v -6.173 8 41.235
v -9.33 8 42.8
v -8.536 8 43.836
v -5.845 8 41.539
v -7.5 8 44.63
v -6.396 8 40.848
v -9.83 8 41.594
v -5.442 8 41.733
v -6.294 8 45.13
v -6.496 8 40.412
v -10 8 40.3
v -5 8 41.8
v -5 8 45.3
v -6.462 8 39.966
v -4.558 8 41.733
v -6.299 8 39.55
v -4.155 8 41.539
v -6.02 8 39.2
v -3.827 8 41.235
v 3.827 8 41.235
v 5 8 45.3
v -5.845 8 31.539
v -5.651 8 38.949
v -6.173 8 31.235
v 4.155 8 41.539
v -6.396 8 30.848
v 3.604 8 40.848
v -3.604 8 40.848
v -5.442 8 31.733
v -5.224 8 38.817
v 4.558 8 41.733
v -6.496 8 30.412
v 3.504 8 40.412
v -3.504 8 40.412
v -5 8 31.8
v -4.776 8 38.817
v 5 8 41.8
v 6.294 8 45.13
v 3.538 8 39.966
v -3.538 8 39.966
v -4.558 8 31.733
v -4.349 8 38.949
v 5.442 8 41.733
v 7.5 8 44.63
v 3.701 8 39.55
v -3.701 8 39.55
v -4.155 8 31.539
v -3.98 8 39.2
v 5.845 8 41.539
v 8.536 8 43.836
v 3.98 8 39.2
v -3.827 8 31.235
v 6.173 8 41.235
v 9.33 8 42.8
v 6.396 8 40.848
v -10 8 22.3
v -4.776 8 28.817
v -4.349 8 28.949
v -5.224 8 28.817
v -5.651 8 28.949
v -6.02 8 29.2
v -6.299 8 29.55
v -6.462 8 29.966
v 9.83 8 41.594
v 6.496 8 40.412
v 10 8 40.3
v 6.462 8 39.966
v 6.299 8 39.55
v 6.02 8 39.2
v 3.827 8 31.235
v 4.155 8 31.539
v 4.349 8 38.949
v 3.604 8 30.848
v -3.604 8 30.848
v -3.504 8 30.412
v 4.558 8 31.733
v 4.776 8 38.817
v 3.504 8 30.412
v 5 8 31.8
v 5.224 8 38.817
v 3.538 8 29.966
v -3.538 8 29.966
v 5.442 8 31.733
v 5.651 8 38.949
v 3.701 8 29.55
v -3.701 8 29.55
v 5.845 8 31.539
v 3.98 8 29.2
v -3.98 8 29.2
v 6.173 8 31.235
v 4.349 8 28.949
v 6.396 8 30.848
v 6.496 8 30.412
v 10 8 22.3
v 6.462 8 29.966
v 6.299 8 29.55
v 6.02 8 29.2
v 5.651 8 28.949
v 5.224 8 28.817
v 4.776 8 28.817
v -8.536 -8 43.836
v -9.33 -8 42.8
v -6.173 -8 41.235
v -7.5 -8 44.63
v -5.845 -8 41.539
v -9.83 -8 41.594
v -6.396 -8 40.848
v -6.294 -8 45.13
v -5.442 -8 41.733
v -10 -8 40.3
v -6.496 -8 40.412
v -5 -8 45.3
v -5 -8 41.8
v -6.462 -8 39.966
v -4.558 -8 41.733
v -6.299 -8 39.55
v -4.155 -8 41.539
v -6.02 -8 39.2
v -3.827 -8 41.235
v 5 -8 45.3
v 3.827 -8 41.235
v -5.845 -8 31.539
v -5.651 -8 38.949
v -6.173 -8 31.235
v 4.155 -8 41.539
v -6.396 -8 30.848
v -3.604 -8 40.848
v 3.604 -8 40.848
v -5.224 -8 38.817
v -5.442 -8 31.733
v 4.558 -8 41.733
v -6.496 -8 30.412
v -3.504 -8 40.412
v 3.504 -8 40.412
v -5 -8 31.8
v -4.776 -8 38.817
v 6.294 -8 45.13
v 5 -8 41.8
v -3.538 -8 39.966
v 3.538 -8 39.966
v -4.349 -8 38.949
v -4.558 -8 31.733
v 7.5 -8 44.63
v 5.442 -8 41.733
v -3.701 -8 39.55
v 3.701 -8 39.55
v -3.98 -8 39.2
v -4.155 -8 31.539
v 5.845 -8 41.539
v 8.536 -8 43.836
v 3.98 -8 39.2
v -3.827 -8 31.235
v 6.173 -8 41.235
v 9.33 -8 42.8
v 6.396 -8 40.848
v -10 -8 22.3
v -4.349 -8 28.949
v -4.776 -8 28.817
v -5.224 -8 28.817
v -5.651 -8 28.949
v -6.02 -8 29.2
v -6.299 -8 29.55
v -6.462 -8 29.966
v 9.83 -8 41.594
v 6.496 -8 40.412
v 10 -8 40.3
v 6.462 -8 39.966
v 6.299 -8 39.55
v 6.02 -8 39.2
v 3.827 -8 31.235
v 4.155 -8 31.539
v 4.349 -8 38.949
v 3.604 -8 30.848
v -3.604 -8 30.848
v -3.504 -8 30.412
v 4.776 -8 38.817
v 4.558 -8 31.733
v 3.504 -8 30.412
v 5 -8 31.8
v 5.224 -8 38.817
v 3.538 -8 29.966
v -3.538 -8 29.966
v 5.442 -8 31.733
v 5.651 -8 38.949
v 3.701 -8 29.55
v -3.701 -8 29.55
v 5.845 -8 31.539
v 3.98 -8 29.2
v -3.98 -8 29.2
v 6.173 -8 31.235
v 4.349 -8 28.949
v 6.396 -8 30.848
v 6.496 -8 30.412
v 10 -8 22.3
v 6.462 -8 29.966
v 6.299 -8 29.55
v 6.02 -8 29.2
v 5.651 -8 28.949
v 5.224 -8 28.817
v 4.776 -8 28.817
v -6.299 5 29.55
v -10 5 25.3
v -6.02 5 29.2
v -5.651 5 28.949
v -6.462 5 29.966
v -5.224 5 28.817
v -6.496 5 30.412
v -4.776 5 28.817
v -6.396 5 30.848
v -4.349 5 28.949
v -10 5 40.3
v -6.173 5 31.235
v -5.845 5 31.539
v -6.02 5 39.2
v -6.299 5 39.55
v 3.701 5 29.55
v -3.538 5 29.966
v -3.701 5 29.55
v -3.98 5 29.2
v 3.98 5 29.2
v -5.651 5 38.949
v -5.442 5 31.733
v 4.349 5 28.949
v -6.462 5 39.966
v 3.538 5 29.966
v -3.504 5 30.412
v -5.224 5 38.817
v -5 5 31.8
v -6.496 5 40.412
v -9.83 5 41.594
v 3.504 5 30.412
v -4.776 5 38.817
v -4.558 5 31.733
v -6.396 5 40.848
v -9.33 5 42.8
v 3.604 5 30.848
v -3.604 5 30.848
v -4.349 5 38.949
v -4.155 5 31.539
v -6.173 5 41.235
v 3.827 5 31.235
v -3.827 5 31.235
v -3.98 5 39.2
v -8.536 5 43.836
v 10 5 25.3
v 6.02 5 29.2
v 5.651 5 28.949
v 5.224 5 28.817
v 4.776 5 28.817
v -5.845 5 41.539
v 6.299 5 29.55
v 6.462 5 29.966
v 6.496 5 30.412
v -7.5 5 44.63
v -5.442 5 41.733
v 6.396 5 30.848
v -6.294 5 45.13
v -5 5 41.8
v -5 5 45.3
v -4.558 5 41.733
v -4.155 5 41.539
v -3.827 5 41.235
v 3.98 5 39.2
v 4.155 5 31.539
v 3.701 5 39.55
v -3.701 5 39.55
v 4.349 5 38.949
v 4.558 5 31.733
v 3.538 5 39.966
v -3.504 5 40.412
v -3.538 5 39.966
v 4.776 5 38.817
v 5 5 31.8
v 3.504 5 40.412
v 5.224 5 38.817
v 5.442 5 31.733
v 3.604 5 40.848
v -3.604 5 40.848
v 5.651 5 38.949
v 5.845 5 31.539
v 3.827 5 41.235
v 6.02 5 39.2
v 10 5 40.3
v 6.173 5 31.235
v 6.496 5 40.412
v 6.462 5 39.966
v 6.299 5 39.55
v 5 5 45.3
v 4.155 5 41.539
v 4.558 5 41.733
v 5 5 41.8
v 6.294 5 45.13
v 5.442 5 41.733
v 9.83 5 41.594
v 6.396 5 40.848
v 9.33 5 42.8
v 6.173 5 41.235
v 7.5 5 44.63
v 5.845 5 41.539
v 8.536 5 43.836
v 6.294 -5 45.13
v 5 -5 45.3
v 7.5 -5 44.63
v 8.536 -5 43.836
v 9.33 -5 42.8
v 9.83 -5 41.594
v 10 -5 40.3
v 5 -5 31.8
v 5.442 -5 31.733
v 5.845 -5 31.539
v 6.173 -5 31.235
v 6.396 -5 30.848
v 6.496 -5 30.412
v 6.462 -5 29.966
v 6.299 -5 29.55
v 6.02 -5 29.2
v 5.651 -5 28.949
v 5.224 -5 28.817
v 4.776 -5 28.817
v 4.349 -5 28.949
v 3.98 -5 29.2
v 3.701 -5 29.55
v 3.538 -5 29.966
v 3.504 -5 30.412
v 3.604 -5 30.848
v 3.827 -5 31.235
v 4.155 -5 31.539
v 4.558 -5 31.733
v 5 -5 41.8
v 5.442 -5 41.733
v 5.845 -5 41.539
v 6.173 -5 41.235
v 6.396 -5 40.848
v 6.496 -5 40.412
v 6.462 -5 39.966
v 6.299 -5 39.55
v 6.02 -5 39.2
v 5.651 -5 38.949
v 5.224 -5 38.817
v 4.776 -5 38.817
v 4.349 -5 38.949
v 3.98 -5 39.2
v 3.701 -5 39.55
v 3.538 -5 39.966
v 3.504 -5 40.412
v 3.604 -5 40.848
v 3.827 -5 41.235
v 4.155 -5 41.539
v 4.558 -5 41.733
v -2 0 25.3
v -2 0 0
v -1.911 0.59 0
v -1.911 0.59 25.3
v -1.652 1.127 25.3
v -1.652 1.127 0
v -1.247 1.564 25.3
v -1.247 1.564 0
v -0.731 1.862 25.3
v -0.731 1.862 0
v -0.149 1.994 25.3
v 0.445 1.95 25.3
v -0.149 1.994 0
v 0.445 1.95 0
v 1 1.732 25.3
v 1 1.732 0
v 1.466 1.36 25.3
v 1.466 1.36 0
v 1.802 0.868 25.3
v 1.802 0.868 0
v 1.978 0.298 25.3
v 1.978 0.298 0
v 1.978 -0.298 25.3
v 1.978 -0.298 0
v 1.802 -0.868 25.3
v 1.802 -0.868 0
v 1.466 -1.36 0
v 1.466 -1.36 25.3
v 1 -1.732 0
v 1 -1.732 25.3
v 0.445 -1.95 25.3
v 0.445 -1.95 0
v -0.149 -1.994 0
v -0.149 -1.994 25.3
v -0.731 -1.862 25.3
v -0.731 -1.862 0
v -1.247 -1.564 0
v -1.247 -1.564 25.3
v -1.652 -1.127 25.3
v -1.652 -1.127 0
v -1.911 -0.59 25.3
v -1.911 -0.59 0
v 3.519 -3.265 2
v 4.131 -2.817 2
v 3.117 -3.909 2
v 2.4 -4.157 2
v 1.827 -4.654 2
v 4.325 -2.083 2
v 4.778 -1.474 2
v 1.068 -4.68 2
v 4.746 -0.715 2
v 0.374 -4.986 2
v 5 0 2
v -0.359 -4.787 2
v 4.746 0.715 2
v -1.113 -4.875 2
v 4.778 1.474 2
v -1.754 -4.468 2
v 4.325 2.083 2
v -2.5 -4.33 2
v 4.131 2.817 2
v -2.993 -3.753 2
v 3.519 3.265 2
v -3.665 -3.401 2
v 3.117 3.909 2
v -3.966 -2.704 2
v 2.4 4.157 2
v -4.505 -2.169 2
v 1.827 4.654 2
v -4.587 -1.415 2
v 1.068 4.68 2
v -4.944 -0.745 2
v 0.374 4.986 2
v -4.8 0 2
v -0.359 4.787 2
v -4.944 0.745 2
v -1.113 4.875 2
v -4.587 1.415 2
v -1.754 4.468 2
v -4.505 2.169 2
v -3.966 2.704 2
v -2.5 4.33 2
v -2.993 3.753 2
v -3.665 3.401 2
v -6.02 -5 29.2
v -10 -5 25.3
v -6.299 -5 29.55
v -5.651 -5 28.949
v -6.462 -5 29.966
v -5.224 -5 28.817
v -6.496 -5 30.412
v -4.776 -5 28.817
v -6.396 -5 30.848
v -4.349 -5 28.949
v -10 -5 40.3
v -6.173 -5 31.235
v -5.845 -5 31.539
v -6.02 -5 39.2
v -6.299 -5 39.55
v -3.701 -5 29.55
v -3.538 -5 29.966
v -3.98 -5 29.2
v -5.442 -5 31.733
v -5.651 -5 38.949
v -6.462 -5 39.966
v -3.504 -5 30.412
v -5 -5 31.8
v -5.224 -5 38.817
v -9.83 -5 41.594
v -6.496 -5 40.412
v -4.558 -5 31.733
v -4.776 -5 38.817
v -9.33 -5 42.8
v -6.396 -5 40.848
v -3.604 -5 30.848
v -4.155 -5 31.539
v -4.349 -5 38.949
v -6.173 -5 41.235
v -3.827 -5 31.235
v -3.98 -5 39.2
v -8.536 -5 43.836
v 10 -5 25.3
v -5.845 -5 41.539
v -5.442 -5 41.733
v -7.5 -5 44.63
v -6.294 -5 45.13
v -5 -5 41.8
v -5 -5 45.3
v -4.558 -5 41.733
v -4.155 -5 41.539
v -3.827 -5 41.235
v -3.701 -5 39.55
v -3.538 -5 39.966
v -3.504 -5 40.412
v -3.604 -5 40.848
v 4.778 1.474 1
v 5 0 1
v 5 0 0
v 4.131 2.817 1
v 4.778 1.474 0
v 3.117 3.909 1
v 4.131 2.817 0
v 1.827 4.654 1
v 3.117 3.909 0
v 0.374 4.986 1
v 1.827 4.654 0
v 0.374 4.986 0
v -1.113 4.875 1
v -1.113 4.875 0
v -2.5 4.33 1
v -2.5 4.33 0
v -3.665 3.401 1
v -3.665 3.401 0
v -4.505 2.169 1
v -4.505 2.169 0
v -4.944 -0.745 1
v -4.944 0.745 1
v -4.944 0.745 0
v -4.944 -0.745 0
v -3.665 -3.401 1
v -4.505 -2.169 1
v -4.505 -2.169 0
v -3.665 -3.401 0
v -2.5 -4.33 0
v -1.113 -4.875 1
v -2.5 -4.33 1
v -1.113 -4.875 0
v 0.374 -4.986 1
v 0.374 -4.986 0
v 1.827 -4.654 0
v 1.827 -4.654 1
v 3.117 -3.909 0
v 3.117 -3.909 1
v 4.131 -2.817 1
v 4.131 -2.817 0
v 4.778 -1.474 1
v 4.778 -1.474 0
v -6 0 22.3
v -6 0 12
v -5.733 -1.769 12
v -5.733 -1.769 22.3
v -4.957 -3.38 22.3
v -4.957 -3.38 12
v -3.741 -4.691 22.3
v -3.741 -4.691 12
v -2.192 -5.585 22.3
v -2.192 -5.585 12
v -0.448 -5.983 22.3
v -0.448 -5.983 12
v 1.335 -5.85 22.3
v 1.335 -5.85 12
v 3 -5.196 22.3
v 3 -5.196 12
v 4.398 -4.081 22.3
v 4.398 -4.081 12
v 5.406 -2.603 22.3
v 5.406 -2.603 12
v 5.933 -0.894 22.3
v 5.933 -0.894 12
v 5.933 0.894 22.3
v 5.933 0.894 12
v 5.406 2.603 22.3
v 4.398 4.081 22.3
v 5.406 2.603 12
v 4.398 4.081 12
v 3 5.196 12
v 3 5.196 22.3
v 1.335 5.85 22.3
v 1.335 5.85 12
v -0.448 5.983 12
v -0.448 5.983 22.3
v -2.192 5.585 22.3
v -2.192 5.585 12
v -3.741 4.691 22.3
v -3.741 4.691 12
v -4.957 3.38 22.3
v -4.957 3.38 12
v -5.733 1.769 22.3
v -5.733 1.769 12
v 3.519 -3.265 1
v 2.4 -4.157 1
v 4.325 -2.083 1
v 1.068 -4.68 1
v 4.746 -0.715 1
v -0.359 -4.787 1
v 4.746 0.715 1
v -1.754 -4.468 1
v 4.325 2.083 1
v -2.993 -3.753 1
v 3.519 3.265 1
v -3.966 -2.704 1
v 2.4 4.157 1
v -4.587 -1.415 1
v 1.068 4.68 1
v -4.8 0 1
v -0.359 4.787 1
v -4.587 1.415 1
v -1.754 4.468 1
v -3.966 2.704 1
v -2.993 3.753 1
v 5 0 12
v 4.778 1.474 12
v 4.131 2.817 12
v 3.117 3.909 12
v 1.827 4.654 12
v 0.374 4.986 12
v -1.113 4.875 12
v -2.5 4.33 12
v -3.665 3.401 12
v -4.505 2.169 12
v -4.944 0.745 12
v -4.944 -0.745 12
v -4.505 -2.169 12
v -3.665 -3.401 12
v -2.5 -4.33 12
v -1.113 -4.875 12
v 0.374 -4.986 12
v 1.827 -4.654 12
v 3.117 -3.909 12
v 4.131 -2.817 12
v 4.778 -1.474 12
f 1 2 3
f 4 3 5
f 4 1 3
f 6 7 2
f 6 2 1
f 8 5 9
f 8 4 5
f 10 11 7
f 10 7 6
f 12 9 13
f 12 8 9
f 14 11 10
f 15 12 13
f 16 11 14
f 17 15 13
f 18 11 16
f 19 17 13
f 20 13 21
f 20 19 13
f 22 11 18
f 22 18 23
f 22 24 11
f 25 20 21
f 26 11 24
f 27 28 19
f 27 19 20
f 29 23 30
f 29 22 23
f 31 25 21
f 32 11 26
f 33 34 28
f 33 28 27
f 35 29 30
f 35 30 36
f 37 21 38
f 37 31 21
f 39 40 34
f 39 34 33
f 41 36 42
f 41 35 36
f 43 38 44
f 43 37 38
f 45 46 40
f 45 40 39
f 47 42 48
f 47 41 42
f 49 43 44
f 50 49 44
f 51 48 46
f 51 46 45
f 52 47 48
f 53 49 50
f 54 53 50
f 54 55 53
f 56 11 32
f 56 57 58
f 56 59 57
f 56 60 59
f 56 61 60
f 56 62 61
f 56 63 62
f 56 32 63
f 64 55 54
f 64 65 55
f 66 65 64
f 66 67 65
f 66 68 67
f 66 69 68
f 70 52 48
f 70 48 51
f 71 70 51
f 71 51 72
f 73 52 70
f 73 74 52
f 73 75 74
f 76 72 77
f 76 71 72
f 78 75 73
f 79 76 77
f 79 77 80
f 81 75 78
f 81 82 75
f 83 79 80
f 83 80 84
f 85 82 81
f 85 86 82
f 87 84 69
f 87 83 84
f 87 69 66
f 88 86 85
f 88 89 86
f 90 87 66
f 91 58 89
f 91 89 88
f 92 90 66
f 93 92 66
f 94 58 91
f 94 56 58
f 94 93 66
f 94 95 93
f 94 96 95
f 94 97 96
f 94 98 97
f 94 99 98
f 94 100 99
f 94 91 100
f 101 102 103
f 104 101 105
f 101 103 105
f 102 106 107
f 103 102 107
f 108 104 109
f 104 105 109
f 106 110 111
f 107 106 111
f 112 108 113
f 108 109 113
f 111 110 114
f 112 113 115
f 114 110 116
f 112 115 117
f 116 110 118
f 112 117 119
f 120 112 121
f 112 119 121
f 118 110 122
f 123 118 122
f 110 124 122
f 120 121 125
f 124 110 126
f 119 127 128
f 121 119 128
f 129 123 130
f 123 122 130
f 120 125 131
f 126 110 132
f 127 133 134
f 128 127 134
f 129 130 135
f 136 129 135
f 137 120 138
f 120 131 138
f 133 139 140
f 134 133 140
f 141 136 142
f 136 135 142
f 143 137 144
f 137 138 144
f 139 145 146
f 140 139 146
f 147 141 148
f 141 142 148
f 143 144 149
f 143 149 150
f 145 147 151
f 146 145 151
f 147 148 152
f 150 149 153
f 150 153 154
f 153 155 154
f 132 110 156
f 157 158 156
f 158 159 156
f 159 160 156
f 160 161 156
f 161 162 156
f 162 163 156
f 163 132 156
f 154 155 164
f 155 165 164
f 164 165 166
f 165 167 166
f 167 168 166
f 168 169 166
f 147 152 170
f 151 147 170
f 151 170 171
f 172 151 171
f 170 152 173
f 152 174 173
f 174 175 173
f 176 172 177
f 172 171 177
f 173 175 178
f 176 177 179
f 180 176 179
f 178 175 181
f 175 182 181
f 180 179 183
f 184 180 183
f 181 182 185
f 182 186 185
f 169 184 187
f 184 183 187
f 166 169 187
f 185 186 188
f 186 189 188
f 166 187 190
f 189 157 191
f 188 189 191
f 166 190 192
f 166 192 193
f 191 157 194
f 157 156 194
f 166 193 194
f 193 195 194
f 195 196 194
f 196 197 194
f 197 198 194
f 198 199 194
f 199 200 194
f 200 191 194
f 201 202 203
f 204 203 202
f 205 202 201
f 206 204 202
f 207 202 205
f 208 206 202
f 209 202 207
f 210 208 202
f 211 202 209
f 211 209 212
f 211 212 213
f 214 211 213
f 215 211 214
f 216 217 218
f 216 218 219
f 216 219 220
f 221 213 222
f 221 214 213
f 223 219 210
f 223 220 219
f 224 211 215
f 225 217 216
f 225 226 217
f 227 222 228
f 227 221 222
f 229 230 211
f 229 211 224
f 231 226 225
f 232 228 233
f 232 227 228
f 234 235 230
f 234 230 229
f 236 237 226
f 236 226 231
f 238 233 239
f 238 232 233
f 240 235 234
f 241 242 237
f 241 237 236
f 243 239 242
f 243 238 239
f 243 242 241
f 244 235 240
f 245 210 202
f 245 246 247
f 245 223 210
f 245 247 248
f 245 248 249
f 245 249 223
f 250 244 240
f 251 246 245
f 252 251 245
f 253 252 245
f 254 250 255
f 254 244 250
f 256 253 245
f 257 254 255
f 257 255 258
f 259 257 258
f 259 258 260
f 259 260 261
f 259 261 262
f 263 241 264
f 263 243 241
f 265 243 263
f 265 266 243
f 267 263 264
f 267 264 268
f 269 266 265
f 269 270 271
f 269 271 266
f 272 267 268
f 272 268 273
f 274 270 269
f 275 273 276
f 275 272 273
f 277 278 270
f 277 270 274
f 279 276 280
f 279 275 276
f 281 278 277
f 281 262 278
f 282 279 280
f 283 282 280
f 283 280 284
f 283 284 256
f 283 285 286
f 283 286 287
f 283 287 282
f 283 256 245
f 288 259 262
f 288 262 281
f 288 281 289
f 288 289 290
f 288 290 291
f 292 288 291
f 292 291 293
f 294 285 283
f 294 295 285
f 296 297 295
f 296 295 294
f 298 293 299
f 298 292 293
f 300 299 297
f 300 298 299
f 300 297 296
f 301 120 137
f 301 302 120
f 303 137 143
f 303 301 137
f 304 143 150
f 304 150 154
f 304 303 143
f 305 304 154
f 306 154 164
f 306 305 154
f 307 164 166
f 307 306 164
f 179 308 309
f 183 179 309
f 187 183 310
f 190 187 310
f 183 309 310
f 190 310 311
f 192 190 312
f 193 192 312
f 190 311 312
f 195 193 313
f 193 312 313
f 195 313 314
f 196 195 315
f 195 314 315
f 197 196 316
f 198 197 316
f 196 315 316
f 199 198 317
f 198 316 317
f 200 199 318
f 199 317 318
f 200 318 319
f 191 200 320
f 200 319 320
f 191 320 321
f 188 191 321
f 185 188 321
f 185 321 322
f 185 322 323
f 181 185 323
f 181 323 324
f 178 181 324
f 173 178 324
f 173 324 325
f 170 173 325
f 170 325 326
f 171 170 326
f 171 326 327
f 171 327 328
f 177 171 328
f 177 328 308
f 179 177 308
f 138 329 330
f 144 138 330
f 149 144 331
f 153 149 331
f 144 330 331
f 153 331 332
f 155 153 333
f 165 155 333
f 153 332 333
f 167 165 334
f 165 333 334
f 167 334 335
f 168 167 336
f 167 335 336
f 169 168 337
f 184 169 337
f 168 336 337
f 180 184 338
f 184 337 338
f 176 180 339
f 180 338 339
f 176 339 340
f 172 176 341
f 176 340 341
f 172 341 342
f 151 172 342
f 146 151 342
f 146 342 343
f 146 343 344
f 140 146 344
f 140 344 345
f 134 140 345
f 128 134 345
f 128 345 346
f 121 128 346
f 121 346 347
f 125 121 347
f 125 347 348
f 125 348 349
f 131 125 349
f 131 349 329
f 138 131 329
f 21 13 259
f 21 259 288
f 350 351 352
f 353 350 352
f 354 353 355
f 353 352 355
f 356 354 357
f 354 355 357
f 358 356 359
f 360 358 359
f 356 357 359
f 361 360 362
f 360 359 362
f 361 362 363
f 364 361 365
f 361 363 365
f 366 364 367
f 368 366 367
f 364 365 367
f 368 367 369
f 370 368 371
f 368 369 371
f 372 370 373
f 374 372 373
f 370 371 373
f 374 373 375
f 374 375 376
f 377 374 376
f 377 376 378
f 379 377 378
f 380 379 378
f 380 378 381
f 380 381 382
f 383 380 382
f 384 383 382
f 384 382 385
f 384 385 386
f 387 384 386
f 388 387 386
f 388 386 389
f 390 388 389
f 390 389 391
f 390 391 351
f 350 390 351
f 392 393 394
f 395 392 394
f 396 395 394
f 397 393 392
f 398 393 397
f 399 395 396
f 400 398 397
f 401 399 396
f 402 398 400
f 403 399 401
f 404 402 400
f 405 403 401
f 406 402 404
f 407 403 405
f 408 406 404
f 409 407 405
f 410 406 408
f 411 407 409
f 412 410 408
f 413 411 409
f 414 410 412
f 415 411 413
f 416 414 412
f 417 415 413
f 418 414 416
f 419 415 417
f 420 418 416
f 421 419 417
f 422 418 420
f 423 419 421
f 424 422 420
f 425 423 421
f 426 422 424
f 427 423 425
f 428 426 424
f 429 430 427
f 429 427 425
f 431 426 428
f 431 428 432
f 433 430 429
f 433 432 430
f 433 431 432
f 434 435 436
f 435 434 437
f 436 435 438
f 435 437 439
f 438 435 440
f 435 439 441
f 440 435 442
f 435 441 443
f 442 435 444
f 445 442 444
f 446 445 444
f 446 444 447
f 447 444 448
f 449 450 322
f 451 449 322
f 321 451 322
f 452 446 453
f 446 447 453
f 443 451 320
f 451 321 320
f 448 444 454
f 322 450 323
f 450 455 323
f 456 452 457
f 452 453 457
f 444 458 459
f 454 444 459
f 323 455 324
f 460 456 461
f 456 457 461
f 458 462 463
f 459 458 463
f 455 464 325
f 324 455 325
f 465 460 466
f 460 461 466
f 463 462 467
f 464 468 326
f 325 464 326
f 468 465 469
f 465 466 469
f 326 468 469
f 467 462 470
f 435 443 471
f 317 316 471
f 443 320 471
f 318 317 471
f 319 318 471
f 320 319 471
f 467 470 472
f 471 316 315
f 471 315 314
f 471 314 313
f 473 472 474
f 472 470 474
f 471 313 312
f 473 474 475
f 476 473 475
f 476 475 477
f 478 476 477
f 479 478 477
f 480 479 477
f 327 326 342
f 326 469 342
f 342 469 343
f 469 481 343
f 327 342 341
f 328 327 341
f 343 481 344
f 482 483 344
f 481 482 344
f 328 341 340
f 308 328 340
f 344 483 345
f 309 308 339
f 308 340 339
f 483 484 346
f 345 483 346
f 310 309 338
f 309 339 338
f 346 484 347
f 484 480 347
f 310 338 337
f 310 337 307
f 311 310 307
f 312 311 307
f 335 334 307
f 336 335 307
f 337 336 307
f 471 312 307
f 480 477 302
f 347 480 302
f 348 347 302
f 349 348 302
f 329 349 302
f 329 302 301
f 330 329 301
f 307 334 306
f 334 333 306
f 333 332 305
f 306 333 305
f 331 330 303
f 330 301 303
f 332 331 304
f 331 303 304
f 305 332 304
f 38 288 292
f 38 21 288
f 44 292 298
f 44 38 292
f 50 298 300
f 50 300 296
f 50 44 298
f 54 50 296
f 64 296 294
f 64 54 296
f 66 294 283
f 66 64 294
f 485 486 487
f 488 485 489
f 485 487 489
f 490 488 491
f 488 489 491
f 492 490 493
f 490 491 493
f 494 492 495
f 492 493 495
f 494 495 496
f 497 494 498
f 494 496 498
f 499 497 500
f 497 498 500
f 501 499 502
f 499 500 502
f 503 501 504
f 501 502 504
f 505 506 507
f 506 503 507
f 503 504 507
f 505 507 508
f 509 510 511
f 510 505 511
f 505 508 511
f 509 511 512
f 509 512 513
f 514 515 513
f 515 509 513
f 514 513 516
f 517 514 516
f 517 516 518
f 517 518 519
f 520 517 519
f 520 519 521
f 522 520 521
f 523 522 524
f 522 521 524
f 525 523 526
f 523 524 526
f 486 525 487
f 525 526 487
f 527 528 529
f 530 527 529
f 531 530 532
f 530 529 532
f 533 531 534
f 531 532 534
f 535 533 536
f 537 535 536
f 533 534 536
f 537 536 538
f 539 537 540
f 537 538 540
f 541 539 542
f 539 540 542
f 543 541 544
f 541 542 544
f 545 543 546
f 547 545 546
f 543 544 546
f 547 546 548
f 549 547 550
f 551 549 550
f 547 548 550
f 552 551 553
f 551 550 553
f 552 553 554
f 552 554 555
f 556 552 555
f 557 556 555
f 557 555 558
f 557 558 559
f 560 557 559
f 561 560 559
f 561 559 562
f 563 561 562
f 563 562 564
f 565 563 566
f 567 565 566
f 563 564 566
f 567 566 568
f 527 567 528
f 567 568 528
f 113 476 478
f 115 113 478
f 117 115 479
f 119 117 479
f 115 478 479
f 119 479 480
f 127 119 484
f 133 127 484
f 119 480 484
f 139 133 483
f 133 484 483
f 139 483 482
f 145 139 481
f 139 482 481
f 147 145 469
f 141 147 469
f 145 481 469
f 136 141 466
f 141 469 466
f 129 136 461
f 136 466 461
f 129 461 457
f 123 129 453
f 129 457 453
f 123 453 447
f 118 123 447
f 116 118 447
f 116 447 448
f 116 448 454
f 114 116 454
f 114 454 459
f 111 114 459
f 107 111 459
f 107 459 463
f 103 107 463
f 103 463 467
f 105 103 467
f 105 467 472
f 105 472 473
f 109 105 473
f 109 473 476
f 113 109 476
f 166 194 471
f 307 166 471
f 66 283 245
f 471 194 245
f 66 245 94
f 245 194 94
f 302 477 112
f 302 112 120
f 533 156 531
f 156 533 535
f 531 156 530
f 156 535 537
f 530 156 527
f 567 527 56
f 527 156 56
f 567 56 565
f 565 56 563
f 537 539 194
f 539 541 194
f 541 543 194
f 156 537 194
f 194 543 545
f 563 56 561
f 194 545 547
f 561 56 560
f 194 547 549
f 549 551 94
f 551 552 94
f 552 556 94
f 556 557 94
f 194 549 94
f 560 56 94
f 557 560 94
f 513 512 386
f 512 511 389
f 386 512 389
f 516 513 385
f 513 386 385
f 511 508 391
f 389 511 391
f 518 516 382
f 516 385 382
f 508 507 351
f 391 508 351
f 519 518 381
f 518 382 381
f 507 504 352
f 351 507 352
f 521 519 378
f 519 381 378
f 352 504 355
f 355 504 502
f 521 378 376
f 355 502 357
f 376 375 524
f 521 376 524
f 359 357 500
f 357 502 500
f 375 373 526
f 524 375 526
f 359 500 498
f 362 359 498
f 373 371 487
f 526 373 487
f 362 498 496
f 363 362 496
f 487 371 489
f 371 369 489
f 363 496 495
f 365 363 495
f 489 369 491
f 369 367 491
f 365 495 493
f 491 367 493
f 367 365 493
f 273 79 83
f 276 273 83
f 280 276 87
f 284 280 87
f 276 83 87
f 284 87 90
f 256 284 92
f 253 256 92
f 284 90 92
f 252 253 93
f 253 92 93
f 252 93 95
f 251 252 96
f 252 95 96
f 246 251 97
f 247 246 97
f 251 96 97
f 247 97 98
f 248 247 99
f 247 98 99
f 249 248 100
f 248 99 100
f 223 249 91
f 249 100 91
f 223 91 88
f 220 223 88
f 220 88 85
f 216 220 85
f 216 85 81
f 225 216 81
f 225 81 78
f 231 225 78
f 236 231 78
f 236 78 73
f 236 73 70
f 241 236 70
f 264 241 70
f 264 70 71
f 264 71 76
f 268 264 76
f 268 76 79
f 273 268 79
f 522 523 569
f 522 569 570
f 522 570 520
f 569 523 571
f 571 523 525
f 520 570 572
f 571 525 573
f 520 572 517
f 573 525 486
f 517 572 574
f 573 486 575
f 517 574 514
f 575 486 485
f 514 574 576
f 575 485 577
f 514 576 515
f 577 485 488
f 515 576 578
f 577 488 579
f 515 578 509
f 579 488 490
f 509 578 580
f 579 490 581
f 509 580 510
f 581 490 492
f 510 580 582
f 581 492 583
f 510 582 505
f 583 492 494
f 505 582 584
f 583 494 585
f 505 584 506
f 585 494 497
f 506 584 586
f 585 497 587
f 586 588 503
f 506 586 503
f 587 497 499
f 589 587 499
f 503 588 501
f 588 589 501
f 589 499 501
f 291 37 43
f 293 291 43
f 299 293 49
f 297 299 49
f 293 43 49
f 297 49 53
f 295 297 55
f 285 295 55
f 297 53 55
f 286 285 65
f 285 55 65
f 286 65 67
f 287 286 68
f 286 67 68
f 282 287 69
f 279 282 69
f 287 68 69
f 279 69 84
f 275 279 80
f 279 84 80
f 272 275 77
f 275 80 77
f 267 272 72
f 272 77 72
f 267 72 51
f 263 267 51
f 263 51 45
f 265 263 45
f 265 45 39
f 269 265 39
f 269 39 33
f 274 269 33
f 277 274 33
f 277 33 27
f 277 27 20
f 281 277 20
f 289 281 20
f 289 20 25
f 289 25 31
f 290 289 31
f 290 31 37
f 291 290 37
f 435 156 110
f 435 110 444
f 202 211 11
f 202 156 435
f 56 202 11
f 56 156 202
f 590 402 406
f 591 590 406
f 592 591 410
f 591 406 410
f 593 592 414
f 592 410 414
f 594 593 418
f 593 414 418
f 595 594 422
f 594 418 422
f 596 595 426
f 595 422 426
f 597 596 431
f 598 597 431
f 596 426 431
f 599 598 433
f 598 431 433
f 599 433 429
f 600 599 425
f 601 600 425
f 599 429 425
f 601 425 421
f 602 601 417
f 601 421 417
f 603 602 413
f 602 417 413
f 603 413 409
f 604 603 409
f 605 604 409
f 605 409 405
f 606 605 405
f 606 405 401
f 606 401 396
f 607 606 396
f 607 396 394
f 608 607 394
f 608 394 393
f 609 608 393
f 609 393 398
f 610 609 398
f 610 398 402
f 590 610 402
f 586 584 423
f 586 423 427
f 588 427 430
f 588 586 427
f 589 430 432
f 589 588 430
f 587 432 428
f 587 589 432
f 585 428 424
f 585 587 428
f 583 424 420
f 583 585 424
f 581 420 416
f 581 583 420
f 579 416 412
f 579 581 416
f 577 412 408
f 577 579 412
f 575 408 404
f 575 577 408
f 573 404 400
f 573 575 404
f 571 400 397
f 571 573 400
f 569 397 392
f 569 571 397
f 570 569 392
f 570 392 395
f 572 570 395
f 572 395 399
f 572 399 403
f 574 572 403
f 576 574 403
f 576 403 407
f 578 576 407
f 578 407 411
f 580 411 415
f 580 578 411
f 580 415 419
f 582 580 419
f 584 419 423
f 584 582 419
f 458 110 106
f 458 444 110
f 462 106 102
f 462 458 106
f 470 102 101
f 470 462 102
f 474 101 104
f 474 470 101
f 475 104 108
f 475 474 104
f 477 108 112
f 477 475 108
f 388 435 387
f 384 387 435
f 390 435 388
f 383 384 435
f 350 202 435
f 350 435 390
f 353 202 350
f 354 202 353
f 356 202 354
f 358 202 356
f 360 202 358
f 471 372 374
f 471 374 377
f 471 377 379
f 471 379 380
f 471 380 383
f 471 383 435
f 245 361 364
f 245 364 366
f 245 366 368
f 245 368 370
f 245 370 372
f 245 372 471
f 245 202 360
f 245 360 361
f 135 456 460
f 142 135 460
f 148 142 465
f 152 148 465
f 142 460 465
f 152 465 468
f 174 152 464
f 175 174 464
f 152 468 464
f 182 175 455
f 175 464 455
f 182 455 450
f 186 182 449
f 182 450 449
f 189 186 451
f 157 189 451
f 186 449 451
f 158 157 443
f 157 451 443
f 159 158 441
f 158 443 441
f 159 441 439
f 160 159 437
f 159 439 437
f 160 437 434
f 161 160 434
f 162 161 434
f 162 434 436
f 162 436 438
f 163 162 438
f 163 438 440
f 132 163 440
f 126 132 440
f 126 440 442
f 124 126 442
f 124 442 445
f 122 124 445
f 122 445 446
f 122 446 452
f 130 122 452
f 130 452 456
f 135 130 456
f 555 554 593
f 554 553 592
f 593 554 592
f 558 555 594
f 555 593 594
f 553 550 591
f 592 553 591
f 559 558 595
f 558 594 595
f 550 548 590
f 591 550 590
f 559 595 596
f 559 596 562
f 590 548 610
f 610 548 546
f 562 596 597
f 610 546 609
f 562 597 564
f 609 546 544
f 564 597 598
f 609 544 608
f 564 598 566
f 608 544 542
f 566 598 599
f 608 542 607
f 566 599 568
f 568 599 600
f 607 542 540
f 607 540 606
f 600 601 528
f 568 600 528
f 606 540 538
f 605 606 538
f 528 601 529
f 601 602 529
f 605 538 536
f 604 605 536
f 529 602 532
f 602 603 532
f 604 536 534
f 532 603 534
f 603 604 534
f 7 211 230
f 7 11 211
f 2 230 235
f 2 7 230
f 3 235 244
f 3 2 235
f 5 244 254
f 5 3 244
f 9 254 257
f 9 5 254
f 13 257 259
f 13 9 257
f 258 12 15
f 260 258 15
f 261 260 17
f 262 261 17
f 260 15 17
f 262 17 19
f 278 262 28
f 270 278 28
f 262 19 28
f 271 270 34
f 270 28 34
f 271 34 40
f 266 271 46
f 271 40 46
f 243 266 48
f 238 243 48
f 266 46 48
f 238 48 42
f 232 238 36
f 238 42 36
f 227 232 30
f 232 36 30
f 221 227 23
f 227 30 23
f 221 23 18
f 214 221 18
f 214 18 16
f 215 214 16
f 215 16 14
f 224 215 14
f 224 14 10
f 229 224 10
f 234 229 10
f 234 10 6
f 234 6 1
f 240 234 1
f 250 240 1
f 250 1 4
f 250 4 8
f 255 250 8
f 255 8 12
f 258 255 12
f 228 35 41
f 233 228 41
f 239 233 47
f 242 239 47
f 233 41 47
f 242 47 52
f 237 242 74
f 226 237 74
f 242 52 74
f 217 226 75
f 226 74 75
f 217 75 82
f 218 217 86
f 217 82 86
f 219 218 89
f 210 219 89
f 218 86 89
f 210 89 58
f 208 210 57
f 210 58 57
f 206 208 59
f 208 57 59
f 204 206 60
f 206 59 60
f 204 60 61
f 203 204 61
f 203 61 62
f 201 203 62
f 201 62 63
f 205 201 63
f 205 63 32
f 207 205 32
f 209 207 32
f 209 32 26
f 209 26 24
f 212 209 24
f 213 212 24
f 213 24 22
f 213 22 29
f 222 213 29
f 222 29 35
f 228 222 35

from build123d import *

# Parameters (mm, degrees)
SKETCH_1_R          = 5
EXTRUDE_1_DEPTH     = 12
SKETCH_2_R          = 5
SKETCH_2_R_2        = 4.8
CUT_EXTRUDE_1_DEPTH = 1
SKETCH_3_R          = 6
EXTRUDE_2_DEPTH     = 10.3
SKETCH_4_W          = 20
SKETCH_4_H          = 16
EXTRUDE_3_DEPTH     = 23
SKETCH_5_W          = 20
SKETCH_5_H          = 10
CUT_EXTRUDE_3_DEPTH = 20
SKETCH_6_R          = 1.5
CUT_EXTRUDE_4_DEPTH = 20
FILLET_1_R          = 5
SKETCH_7_R          = 2
CUT_EXTRUDE_5_DEPTH = 48.075365107


with BuildPart() as part:
    # 草图1 → 凸台-拉伸1 (new body)
    with BuildSketch(Plane.XY):
        Circle(SKETCH_1_R)
    extrude(amount=EXTRUDE_1_DEPTH)

    # 草图2 → 切除-拉伸1 (cut)
    with BuildSketch(Plane(origin=(0, 0, 1), x_dir=(-1, 0, 0), z_dir=(0, 0, -1))):
        Circle(SKETCH_2_R)
        Circle(SKETCH_2_R_2, mode=Mode.SUBTRACT)
    extrude(amount=-CUT_EXTRUDE_1_DEPTH, mode=Mode.SUBTRACT)

    # 草图3 → 凸台-拉伸2 (add)
    with BuildSketch(Plane.XY.offset(12)):
        with Locations(Location((0, 0, 0), (0, 0, 180))):
            Circle(SKETCH_3_R)
    extrude(amount=EXTRUDE_2_DEPTH)

    # 草图4 → 凸台-拉伸3 (add)
    with BuildSketch(Plane.XY.offset(22.3)):
        Rectangle(SKETCH_4_W, SKETCH_4_H)
    extrude(amount=EXTRUDE_3_DEPTH)

    # 草图5 → 切除-拉伸3 (cut)
    with BuildSketch(Plane.XY.offset(45.3)):
        Rectangle(SKETCH_5_W, SKETCH_5_H)
    extrude(amount=-CUT_EXTRUDE_3_DEPTH, mode=Mode.SUBTRACT)

    # 草图6 → 切除-拉伸4 (cut)
    with BuildSketch(Plane(origin=(0, 8, 0), x_dir=(1, 0, 0), z_dir=(0, 1, 0))):
        with Locations(Location((5, -40.3, 0), (0, 0, 270))):
            Circle(SKETCH_6_R)
        with Locations(Location((-5, -40.3, 0), (0, 0, 270))):
            Circle(SKETCH_6_R)
        with Locations(Location((-5, -30.3, 0), (0, 0, 270))):
            Circle(SKETCH_6_R)
        with Locations(Location((5, -30.3, 0), (0, 0, 270))):
            Circle(SKETCH_6_R)
    extrude(amount=-CUT_EXTRUDE_4_DEPTH, mode=Mode.SUBTRACT)

    # 圆角1
    fillet_1_edges = [part.edges().sort_by_distance(p)[0] for p in [
        (10, -6.5, 45.3),
        (-10, 6.5, 45.3),
        (10, 6.5, 45.3),
        (-10, -6.5, 45.3),
    ]]
    fillet(fillet_1_edges, radius=FILLET_1_R)

    # 草图7 → 切除-拉伸5 (cut, through all)
    with BuildSketch(Plane(origin=(0, 0, 0), x_dir=(-1, 0, 0), z_dir=(0, 0, -1))):
        Circle(SKETCH_7_R)
    extrude(amount=-CUT_EXTRUDE_5_DEPTH, mode=Mode.SUBTRACT)


solid = part.part
